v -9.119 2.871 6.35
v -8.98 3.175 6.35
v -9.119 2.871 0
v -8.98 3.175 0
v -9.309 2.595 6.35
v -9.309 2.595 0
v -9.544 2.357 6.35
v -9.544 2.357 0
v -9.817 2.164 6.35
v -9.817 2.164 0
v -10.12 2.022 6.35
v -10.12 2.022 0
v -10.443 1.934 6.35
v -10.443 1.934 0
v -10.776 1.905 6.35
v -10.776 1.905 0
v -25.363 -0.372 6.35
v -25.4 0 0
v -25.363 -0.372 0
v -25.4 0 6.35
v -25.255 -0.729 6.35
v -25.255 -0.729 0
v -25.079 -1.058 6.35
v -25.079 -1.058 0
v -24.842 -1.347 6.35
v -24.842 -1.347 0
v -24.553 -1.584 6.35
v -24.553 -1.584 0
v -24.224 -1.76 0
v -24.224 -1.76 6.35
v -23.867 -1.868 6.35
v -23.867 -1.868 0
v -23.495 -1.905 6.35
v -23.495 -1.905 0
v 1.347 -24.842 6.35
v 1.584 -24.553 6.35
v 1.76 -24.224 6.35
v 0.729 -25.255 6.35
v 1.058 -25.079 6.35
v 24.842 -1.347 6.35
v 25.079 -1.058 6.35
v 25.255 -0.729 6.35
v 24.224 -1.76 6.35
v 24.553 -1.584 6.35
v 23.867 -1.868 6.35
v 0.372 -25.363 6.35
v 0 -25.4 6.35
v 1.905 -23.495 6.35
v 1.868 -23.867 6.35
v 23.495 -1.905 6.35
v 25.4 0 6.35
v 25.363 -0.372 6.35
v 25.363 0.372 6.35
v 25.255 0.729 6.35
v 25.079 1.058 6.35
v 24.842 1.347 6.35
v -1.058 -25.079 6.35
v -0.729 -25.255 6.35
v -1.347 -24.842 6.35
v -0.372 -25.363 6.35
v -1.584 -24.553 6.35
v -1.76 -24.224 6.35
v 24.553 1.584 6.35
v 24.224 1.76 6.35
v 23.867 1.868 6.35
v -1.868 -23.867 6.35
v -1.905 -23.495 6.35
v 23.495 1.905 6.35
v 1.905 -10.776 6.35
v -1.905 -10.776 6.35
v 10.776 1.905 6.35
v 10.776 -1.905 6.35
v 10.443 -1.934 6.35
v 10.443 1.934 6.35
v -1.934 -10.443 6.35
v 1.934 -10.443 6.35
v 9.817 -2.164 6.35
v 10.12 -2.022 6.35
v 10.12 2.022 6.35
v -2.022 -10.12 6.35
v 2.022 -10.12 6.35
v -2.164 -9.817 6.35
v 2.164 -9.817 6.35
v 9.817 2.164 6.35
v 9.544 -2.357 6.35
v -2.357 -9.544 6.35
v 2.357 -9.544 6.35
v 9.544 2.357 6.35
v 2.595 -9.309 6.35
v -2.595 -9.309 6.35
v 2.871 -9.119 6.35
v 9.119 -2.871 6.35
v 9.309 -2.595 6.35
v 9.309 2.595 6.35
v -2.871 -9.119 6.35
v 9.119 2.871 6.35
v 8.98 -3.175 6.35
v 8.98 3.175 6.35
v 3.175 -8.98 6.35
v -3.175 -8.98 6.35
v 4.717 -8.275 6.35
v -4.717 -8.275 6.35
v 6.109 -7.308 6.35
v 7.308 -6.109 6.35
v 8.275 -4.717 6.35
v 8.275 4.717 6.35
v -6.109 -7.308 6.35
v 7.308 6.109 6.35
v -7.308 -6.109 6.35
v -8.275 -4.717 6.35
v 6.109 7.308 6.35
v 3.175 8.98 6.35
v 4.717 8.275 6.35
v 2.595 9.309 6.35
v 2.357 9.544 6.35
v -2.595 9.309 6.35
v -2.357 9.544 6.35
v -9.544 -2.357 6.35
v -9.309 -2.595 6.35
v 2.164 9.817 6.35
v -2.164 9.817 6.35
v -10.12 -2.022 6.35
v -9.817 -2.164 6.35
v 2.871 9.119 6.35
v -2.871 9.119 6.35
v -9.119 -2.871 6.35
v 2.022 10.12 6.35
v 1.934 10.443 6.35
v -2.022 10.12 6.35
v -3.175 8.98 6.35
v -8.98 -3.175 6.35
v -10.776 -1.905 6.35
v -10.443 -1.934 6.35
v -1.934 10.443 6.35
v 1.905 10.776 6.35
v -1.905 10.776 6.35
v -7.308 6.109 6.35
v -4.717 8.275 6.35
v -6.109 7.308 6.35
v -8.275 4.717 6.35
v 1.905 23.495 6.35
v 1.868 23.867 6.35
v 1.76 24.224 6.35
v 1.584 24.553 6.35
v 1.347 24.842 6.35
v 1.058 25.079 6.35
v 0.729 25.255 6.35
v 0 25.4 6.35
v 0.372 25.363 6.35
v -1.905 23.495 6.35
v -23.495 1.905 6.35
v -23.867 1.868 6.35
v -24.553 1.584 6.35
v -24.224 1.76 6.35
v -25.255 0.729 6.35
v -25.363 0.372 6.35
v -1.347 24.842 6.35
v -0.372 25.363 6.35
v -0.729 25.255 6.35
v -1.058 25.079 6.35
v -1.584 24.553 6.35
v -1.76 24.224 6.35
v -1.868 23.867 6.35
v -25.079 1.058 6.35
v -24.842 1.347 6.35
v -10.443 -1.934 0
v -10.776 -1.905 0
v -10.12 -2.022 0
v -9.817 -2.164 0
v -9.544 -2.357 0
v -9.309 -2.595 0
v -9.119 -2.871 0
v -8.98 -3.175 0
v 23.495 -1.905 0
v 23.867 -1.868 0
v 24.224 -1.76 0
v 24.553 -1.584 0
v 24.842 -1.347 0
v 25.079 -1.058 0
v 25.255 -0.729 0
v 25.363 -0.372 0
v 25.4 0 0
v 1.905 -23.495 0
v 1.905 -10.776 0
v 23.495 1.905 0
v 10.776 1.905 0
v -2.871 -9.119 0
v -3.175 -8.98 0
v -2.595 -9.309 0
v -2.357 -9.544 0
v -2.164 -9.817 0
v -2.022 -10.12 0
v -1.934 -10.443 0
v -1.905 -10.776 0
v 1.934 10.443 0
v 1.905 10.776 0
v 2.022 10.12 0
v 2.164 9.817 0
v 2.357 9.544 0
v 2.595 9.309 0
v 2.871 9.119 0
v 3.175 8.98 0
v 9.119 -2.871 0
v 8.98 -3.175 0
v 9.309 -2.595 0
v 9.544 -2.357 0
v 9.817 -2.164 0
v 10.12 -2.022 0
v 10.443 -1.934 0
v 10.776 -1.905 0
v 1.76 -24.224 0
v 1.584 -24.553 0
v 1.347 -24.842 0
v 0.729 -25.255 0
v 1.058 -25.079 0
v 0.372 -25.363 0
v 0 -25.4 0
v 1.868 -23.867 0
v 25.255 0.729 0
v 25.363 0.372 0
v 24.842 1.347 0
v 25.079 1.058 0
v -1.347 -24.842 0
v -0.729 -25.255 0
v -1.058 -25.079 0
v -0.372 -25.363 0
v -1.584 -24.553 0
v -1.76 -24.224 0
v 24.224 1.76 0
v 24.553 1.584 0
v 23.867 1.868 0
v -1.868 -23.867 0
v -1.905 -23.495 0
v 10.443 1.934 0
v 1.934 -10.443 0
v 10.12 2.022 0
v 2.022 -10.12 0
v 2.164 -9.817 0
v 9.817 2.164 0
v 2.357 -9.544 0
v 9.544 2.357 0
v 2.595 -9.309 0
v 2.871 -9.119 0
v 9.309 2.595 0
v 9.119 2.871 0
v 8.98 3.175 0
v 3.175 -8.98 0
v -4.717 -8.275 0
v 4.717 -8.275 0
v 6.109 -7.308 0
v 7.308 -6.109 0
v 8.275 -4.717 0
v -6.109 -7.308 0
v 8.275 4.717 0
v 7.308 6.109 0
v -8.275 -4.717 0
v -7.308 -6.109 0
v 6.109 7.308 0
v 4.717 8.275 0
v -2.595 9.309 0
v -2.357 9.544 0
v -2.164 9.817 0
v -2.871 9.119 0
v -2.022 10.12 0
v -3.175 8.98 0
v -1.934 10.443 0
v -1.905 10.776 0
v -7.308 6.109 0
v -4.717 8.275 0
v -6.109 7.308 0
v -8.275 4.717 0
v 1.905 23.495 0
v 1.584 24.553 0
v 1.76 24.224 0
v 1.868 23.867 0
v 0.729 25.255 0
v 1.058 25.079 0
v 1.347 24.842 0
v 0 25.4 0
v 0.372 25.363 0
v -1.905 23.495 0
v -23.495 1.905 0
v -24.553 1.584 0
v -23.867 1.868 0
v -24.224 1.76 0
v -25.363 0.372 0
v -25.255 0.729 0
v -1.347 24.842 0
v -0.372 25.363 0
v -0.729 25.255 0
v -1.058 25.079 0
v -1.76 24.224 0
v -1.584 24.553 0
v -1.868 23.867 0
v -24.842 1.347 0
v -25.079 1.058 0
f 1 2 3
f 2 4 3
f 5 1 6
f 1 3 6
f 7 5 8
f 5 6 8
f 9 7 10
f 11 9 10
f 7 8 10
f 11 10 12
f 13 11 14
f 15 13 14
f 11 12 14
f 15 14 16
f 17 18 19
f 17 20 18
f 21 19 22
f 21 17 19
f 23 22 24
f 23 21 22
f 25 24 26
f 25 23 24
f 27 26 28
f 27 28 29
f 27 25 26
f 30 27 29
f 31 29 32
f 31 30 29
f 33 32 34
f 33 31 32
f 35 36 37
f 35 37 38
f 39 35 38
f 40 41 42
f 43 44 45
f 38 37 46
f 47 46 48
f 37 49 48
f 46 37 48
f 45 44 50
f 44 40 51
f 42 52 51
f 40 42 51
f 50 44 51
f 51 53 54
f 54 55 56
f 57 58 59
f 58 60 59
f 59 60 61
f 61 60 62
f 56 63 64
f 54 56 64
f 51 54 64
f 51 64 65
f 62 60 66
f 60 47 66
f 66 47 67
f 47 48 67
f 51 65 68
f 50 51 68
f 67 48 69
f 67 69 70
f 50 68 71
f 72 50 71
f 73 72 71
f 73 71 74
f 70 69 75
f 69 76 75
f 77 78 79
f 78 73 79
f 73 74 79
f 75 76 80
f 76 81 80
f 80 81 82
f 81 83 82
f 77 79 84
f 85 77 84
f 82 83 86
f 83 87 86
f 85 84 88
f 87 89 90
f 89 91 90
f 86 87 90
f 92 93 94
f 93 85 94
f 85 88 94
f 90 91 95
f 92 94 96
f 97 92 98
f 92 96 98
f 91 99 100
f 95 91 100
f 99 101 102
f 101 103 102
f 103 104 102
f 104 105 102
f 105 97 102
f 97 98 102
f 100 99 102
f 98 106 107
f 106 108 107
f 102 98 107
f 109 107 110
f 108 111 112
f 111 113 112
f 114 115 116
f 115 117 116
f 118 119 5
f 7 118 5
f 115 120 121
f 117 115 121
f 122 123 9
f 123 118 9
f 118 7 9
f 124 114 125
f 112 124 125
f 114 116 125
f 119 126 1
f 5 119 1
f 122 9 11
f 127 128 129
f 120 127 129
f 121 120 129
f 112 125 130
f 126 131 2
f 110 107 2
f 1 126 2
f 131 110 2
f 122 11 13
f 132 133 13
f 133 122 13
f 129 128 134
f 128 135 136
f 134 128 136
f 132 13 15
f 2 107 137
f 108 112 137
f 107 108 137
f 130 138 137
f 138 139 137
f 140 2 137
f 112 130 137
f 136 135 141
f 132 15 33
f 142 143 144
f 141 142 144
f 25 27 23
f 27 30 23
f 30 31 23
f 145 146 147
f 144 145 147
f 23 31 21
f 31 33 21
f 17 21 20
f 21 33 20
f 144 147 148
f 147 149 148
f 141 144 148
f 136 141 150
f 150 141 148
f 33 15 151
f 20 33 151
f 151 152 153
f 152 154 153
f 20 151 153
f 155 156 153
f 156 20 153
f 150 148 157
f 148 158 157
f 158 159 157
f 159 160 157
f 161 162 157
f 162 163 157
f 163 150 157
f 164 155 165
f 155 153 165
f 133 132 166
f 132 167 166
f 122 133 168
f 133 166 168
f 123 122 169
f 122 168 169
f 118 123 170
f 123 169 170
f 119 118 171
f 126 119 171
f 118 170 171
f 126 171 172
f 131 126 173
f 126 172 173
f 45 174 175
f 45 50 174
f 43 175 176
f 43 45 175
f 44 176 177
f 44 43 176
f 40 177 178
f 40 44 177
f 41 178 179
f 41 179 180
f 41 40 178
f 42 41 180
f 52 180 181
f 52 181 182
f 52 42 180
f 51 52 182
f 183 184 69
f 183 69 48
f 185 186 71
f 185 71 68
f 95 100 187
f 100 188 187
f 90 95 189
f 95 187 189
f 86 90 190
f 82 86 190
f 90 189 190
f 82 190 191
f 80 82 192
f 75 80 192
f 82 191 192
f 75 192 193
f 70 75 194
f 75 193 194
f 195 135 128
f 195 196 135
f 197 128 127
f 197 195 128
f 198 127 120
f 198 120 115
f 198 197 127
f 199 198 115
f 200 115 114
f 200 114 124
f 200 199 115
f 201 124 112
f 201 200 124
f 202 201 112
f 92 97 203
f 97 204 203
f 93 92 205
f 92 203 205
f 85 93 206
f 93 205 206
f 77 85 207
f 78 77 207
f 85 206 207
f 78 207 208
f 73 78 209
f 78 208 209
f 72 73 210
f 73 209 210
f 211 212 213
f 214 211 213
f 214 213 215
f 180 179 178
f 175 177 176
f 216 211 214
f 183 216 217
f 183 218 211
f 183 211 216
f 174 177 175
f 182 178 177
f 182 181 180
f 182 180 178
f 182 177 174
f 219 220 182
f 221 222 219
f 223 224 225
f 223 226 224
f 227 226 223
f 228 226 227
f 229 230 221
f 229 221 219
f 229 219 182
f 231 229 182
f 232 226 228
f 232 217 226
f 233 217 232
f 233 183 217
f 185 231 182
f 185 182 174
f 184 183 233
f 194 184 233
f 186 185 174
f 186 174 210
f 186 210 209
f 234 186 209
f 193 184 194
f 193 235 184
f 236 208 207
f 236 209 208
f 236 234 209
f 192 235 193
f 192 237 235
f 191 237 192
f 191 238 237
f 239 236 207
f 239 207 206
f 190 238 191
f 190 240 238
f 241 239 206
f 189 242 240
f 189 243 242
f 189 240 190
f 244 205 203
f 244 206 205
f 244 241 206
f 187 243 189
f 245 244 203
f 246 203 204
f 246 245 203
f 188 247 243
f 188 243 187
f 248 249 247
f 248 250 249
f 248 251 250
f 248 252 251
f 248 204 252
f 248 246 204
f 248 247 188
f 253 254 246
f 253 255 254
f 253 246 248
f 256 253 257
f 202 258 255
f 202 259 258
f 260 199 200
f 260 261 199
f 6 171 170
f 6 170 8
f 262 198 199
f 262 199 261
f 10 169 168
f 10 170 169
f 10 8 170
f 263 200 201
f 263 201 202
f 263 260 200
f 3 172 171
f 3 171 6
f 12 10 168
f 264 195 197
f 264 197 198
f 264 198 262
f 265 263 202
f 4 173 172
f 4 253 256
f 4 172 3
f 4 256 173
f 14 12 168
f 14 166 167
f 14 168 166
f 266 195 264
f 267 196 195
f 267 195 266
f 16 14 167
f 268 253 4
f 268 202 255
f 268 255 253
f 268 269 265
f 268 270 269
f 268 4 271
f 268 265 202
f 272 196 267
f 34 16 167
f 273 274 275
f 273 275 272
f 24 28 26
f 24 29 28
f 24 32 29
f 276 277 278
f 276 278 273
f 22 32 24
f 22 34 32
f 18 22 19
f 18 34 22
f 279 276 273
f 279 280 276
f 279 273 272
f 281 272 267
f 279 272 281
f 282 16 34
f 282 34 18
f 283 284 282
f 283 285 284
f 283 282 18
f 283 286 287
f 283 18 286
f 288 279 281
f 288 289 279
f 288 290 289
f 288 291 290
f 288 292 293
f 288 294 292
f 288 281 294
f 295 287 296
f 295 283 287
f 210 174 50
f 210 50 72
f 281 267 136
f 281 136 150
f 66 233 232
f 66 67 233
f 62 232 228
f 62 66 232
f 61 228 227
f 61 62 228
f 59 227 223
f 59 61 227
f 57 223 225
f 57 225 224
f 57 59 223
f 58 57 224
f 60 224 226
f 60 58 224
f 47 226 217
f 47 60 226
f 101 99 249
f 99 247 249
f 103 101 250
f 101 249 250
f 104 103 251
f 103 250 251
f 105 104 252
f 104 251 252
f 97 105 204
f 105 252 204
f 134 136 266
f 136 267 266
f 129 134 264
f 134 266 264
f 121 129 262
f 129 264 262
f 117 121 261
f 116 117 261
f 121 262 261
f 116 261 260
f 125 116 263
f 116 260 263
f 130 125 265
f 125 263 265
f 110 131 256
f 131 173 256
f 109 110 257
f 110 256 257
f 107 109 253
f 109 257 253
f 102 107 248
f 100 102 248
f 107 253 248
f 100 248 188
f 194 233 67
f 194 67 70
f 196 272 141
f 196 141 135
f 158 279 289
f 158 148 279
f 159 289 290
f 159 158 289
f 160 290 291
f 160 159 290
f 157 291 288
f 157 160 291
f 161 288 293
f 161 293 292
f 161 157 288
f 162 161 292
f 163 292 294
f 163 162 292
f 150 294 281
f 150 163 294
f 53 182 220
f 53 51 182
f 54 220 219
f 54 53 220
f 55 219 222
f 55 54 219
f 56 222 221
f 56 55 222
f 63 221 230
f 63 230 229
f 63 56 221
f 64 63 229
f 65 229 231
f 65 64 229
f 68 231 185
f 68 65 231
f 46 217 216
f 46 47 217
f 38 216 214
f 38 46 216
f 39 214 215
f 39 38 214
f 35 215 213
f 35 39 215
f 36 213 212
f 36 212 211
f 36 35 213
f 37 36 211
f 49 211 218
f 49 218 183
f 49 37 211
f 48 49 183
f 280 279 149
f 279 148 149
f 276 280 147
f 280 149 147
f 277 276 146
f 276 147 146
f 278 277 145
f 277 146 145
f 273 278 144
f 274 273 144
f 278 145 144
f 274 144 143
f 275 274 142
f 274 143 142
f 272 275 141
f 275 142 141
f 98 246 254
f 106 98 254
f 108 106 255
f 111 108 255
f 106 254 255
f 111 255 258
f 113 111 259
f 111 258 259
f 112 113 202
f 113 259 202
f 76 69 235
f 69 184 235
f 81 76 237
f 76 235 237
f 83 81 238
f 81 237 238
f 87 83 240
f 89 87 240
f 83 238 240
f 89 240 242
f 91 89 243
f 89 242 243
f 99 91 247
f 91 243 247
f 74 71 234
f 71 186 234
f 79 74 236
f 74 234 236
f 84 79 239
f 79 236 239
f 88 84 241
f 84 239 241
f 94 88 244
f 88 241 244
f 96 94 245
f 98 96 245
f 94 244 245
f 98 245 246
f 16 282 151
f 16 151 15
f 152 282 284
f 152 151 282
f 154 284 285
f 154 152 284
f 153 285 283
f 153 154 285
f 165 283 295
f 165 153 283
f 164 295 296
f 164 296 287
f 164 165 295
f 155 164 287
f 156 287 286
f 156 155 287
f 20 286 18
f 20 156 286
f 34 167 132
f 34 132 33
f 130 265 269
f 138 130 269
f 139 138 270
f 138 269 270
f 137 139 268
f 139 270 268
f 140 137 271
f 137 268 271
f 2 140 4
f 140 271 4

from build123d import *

# Parameters (mm, degrees)
BOSS_EXTRUDE1_DEPTH = 6.35
SKETCH2_R           = 9.525
BOSS_EXTRUDE2_DEPTH = 6.35
FILLET1_R           = 1.905


with BuildPart() as part:
    # Sketch1 → Boss-Extrude1 (new body)
    with BuildSketch(Plane.XY):
        Polygon((0, 25.4), (1.905, 25.4), (1.905, 1.905), (25.4, 1.905), (25.4, 0), (25.4, -1.905), (1.905, -1.905), (1.905, -25.4), (0, -25.4), (-1.905, -25.4), (-1.905, -1.905), (-25.4, -1.905), (-25.4, 0), (-25.4, 1.905), (-1.905, 1.905), (-1.905, 25.4), align=None)
    extrude(amount=BOSS_EXTRUDE1_DEPTH)

    # Sketch2 → Boss-Extrude2 (add)
    with BuildSketch(Plane.XY):
        Circle(SKETCH2_R)
    extrude(amount=BOSS_EXTRUDE2_DEPTH)

    # Fillet1
    fillet1_edges = [part.edges().sort_by_distance(p)[0] for p in [
        (-9.33255592, -1.905, 3.175),
        (-1.905, -9.33255592, 3.175),
        (-9.33255592, 1.905, 3.175),
        (-1.905, 9.33255592, 3.175),
        (1.905, 9.33255592, 3.175),
        (9.33255592, 1.905, 3.175),
        (9.33255592, -1.905, 3.175),
        (1.905, -9.33255592, 3.175),
        (25.4, 1.905, 3.175),
        (25.4, -1.905, 3.175),
        (1.905, -25.4, 3.175),
        (-1.905, -25.4, 3.175),
        (-25.4, -1.905, 3.175),
        (-25.4, 1.905, 3.175),
        (-1.905, 25.4, 3.175),
        (1.905, 25.4, 3.175),
    ]]
    fillet(fillet1_edges, radius=FILLET1_R - 0.0001)  # a hair under: the kernel refuses the full size


solid = part.part
